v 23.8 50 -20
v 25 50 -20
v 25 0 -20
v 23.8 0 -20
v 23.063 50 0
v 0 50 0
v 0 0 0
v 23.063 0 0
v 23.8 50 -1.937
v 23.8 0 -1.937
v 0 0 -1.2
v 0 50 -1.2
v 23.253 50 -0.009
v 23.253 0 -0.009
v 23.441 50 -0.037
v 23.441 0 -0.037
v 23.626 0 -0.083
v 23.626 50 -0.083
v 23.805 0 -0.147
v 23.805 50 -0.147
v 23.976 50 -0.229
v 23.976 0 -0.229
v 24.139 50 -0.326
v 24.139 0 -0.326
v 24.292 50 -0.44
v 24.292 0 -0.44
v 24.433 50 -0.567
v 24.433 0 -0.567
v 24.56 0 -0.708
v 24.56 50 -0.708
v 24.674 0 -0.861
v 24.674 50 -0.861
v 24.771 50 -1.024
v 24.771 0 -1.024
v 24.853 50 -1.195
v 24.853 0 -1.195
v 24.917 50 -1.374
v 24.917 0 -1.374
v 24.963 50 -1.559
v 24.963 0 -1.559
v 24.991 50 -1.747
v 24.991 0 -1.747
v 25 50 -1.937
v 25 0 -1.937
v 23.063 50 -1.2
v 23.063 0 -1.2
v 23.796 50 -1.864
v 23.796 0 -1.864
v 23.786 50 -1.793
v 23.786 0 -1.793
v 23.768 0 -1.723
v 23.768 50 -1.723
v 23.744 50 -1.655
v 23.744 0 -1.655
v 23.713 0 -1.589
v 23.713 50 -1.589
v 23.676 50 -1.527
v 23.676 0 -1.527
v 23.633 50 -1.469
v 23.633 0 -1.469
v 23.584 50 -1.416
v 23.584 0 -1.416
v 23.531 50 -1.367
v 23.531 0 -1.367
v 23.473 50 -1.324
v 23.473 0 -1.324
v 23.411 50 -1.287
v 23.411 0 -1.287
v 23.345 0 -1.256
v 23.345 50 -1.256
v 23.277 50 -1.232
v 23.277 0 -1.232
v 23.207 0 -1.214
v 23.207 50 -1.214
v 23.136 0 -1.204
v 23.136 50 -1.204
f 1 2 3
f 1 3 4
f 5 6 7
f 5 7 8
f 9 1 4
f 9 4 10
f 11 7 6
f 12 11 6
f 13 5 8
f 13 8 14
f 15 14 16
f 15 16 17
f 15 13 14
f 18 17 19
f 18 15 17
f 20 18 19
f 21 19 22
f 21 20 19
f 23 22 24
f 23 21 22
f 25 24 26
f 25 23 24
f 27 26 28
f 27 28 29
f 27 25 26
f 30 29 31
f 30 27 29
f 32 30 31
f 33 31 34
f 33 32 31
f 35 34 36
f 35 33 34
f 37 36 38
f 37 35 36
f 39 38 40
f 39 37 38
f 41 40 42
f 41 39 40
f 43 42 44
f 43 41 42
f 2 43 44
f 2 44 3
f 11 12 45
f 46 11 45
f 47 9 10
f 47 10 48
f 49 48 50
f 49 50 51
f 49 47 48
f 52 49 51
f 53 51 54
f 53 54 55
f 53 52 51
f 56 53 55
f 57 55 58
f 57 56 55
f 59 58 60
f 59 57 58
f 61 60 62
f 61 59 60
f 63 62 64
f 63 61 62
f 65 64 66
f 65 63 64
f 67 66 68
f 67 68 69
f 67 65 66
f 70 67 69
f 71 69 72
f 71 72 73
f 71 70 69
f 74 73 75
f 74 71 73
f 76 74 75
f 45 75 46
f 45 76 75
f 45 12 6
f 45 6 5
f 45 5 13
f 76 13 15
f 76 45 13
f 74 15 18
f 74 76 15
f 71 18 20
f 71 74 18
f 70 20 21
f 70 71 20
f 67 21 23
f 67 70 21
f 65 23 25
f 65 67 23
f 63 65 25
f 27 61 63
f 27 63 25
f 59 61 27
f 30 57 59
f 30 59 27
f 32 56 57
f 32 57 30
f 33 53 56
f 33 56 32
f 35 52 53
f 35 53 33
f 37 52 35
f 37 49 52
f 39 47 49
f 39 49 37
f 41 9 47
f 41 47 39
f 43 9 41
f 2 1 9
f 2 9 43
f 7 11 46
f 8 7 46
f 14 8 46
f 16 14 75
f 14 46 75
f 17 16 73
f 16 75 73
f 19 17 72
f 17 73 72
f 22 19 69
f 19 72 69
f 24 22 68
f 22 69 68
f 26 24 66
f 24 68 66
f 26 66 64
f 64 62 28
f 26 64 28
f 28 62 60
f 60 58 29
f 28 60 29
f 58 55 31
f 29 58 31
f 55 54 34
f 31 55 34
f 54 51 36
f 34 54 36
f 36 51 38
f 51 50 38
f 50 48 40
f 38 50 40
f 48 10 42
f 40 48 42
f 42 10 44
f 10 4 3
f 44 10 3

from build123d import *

# Parameters (mm, degrees)
SKETCH4_W                    = 25
SKETCH4_H                    = 50
BASE_FLANGE1_DEPTH           = 1.2
EDGE_FLANGE1_STRIP_W         = 6.2732
EDGE_FLANGE1_STRIP_H         = 1.2
EDGE_FLANGE1_STRIP_CUT_DEPTH = 50
EDGE_FLANGE1_DEPTH           = 50


# Sheet-metal steps are written as plain solids
with BuildPart() as part:
    # Sketch4 → Base-Flange1 (new body)
    with BuildSketch(Plane.XY):
        with Locations((12.5, 25)):
            Rectangle(SKETCH4_W, SKETCH4_H)
    extrude(amount=-BASE_FLANGE1_DEPTH)

    # Edge-Flange1 strip (across the edge) → Edge-Flange1 strip cut (cut)
    with BuildSketch(Plane(origin=(25, 50, -1.2), x_dir=(-1, 0, 0), z_dir=(0, -1, 0))):
        with Locations((-1.2, -0.6)):
            Rectangle(EDGE_FLANGE1_STRIP_W, EDGE_FLANGE1_STRIP_H)
    extrude(amount=EDGE_FLANGE1_STRIP_CUT_DEPTH, mode=Mode.SUBTRACT)

    # Edge-Flange1 section (across the edge) → Edge-Flange1 (add)
    with BuildSketch(Plane(origin=(25, 50, -1.2), x_dir=(-1, 0, 0), z_dir=(0, -1, 0))):
        with BuildLine():
            Line((0, 0.7366), (0, 18.8))
            Line((0, 18.8), (1.2, 18.8))
            Line((1.2, 18.8), (1.2, 0.7366))
            ThreePointArc((1.2, 0.7366), (1.415745145, 0.215745145), (1.9366, 0))
            Line((1.9366, 0), (1.9366, -1.2))
            ThreePointArc((1.9366, -1.2), (0.567217008, -0.632782992), (0, 0.7366))
        make_face()
    extrude(amount=EDGE_FLANGE1_DEPTH)


solid = part.part
